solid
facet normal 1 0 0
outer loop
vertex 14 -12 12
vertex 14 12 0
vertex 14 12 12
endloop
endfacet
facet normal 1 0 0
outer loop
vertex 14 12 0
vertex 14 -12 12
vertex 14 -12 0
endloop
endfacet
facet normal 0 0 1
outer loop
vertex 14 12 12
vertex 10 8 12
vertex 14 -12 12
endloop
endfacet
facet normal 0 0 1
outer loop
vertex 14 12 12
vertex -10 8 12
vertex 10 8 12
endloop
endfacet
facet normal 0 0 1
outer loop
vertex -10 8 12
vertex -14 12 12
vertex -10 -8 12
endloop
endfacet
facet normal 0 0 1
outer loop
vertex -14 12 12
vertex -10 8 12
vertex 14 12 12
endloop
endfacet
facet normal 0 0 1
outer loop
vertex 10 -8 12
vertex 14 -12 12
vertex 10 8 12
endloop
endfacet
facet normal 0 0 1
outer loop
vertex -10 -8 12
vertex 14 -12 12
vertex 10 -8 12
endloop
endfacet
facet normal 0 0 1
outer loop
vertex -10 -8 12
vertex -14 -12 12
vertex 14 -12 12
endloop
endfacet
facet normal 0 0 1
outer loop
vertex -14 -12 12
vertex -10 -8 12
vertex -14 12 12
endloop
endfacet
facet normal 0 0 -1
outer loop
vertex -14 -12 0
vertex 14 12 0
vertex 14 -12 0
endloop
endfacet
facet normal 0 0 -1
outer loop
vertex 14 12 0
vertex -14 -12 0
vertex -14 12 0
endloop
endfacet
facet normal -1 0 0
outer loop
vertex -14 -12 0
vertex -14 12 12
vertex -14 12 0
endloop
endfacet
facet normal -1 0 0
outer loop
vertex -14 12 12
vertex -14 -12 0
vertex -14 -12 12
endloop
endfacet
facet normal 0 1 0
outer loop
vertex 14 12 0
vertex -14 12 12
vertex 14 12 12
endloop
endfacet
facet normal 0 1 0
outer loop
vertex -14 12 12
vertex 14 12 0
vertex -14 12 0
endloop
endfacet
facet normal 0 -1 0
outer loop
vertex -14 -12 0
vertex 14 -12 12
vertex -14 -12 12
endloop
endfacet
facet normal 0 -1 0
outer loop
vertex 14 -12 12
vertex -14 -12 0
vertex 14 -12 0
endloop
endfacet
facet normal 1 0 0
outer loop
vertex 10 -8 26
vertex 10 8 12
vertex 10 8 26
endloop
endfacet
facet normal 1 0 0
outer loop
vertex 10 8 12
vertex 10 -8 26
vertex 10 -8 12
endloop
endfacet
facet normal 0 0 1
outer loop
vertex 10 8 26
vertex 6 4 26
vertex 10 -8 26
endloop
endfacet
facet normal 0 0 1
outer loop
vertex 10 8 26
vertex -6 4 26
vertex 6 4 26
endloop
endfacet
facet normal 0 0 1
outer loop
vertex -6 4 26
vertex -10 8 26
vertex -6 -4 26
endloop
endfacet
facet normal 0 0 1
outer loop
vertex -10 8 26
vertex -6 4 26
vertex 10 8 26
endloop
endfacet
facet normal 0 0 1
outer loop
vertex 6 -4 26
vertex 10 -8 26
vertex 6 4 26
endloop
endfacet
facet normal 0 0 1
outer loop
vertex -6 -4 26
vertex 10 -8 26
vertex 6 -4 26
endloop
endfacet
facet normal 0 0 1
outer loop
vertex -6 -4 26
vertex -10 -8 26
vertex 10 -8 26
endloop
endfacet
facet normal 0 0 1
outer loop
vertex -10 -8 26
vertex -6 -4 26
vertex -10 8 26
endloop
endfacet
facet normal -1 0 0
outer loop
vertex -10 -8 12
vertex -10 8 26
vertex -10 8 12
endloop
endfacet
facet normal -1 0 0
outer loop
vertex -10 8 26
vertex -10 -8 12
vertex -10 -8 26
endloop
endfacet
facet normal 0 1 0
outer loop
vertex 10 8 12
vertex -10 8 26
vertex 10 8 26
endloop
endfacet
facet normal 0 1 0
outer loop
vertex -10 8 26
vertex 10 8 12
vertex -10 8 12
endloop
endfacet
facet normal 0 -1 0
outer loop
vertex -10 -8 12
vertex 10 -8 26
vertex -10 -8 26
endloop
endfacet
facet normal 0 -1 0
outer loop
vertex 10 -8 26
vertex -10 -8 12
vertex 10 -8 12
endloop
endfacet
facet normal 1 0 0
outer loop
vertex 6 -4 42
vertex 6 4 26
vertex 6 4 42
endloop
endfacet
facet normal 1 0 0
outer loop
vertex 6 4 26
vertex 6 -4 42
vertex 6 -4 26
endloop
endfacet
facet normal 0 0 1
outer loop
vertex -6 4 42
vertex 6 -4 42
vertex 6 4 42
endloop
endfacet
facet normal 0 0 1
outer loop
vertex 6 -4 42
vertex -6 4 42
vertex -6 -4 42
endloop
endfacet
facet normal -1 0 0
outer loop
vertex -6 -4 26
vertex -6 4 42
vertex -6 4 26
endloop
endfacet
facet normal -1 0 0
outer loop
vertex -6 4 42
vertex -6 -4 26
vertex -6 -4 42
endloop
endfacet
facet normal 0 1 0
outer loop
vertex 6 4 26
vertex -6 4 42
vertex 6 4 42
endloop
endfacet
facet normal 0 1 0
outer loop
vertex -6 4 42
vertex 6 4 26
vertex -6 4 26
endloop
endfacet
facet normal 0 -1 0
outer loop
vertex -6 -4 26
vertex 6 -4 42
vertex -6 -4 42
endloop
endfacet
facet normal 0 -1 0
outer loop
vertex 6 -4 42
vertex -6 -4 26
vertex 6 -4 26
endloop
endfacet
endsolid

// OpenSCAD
// Placeholder for a second model, used in both the flyover and a credit render.
union() {
    translate([-14,-12,0]) cube([28,24,12]);
    translate([-10,-8,12]) cube([20,16,14]);
    translate([-6,-4,26]) cube([12,8,16]);
}
